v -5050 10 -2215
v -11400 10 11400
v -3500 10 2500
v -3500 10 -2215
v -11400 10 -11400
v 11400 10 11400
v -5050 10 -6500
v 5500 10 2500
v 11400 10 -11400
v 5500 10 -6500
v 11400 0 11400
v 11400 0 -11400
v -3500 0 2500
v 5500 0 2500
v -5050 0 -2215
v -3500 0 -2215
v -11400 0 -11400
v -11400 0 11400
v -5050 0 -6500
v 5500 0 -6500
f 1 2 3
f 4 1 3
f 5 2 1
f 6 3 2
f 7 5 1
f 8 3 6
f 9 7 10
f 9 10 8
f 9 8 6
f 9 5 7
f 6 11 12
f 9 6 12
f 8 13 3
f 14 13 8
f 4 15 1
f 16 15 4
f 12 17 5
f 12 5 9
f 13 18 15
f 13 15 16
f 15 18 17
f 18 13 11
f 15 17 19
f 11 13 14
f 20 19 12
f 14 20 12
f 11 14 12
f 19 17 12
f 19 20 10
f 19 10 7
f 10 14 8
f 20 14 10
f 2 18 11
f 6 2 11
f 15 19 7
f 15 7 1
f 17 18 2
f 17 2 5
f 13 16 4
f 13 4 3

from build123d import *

# Parameters (mm, degrees)
SKETCH1_W           = 22800
SKETCH1_H           = 22800
BOSS_EXTRUDE1_DEPTH = 10


with BuildPart() as part:
    # Sketch1 → Boss-Extrude1 (new body)
    with BuildSketch(Plane(origin=(0, 0, 0), x_dir=(1, 0, 0), z_dir=(0, 1, 0))):
        Rectangle(SKETCH1_W, SKETCH1_H)
        Polygon((-3500, -2500), (5500, -2500), (5500, 6500), (-5050, 6500), (-5050, 2215), (-3500, 2215), align=None, mode=Mode.SUBTRACT)
    extrude(amount=BOSS_EXTRUDE1_DEPTH)


solid = part.part
